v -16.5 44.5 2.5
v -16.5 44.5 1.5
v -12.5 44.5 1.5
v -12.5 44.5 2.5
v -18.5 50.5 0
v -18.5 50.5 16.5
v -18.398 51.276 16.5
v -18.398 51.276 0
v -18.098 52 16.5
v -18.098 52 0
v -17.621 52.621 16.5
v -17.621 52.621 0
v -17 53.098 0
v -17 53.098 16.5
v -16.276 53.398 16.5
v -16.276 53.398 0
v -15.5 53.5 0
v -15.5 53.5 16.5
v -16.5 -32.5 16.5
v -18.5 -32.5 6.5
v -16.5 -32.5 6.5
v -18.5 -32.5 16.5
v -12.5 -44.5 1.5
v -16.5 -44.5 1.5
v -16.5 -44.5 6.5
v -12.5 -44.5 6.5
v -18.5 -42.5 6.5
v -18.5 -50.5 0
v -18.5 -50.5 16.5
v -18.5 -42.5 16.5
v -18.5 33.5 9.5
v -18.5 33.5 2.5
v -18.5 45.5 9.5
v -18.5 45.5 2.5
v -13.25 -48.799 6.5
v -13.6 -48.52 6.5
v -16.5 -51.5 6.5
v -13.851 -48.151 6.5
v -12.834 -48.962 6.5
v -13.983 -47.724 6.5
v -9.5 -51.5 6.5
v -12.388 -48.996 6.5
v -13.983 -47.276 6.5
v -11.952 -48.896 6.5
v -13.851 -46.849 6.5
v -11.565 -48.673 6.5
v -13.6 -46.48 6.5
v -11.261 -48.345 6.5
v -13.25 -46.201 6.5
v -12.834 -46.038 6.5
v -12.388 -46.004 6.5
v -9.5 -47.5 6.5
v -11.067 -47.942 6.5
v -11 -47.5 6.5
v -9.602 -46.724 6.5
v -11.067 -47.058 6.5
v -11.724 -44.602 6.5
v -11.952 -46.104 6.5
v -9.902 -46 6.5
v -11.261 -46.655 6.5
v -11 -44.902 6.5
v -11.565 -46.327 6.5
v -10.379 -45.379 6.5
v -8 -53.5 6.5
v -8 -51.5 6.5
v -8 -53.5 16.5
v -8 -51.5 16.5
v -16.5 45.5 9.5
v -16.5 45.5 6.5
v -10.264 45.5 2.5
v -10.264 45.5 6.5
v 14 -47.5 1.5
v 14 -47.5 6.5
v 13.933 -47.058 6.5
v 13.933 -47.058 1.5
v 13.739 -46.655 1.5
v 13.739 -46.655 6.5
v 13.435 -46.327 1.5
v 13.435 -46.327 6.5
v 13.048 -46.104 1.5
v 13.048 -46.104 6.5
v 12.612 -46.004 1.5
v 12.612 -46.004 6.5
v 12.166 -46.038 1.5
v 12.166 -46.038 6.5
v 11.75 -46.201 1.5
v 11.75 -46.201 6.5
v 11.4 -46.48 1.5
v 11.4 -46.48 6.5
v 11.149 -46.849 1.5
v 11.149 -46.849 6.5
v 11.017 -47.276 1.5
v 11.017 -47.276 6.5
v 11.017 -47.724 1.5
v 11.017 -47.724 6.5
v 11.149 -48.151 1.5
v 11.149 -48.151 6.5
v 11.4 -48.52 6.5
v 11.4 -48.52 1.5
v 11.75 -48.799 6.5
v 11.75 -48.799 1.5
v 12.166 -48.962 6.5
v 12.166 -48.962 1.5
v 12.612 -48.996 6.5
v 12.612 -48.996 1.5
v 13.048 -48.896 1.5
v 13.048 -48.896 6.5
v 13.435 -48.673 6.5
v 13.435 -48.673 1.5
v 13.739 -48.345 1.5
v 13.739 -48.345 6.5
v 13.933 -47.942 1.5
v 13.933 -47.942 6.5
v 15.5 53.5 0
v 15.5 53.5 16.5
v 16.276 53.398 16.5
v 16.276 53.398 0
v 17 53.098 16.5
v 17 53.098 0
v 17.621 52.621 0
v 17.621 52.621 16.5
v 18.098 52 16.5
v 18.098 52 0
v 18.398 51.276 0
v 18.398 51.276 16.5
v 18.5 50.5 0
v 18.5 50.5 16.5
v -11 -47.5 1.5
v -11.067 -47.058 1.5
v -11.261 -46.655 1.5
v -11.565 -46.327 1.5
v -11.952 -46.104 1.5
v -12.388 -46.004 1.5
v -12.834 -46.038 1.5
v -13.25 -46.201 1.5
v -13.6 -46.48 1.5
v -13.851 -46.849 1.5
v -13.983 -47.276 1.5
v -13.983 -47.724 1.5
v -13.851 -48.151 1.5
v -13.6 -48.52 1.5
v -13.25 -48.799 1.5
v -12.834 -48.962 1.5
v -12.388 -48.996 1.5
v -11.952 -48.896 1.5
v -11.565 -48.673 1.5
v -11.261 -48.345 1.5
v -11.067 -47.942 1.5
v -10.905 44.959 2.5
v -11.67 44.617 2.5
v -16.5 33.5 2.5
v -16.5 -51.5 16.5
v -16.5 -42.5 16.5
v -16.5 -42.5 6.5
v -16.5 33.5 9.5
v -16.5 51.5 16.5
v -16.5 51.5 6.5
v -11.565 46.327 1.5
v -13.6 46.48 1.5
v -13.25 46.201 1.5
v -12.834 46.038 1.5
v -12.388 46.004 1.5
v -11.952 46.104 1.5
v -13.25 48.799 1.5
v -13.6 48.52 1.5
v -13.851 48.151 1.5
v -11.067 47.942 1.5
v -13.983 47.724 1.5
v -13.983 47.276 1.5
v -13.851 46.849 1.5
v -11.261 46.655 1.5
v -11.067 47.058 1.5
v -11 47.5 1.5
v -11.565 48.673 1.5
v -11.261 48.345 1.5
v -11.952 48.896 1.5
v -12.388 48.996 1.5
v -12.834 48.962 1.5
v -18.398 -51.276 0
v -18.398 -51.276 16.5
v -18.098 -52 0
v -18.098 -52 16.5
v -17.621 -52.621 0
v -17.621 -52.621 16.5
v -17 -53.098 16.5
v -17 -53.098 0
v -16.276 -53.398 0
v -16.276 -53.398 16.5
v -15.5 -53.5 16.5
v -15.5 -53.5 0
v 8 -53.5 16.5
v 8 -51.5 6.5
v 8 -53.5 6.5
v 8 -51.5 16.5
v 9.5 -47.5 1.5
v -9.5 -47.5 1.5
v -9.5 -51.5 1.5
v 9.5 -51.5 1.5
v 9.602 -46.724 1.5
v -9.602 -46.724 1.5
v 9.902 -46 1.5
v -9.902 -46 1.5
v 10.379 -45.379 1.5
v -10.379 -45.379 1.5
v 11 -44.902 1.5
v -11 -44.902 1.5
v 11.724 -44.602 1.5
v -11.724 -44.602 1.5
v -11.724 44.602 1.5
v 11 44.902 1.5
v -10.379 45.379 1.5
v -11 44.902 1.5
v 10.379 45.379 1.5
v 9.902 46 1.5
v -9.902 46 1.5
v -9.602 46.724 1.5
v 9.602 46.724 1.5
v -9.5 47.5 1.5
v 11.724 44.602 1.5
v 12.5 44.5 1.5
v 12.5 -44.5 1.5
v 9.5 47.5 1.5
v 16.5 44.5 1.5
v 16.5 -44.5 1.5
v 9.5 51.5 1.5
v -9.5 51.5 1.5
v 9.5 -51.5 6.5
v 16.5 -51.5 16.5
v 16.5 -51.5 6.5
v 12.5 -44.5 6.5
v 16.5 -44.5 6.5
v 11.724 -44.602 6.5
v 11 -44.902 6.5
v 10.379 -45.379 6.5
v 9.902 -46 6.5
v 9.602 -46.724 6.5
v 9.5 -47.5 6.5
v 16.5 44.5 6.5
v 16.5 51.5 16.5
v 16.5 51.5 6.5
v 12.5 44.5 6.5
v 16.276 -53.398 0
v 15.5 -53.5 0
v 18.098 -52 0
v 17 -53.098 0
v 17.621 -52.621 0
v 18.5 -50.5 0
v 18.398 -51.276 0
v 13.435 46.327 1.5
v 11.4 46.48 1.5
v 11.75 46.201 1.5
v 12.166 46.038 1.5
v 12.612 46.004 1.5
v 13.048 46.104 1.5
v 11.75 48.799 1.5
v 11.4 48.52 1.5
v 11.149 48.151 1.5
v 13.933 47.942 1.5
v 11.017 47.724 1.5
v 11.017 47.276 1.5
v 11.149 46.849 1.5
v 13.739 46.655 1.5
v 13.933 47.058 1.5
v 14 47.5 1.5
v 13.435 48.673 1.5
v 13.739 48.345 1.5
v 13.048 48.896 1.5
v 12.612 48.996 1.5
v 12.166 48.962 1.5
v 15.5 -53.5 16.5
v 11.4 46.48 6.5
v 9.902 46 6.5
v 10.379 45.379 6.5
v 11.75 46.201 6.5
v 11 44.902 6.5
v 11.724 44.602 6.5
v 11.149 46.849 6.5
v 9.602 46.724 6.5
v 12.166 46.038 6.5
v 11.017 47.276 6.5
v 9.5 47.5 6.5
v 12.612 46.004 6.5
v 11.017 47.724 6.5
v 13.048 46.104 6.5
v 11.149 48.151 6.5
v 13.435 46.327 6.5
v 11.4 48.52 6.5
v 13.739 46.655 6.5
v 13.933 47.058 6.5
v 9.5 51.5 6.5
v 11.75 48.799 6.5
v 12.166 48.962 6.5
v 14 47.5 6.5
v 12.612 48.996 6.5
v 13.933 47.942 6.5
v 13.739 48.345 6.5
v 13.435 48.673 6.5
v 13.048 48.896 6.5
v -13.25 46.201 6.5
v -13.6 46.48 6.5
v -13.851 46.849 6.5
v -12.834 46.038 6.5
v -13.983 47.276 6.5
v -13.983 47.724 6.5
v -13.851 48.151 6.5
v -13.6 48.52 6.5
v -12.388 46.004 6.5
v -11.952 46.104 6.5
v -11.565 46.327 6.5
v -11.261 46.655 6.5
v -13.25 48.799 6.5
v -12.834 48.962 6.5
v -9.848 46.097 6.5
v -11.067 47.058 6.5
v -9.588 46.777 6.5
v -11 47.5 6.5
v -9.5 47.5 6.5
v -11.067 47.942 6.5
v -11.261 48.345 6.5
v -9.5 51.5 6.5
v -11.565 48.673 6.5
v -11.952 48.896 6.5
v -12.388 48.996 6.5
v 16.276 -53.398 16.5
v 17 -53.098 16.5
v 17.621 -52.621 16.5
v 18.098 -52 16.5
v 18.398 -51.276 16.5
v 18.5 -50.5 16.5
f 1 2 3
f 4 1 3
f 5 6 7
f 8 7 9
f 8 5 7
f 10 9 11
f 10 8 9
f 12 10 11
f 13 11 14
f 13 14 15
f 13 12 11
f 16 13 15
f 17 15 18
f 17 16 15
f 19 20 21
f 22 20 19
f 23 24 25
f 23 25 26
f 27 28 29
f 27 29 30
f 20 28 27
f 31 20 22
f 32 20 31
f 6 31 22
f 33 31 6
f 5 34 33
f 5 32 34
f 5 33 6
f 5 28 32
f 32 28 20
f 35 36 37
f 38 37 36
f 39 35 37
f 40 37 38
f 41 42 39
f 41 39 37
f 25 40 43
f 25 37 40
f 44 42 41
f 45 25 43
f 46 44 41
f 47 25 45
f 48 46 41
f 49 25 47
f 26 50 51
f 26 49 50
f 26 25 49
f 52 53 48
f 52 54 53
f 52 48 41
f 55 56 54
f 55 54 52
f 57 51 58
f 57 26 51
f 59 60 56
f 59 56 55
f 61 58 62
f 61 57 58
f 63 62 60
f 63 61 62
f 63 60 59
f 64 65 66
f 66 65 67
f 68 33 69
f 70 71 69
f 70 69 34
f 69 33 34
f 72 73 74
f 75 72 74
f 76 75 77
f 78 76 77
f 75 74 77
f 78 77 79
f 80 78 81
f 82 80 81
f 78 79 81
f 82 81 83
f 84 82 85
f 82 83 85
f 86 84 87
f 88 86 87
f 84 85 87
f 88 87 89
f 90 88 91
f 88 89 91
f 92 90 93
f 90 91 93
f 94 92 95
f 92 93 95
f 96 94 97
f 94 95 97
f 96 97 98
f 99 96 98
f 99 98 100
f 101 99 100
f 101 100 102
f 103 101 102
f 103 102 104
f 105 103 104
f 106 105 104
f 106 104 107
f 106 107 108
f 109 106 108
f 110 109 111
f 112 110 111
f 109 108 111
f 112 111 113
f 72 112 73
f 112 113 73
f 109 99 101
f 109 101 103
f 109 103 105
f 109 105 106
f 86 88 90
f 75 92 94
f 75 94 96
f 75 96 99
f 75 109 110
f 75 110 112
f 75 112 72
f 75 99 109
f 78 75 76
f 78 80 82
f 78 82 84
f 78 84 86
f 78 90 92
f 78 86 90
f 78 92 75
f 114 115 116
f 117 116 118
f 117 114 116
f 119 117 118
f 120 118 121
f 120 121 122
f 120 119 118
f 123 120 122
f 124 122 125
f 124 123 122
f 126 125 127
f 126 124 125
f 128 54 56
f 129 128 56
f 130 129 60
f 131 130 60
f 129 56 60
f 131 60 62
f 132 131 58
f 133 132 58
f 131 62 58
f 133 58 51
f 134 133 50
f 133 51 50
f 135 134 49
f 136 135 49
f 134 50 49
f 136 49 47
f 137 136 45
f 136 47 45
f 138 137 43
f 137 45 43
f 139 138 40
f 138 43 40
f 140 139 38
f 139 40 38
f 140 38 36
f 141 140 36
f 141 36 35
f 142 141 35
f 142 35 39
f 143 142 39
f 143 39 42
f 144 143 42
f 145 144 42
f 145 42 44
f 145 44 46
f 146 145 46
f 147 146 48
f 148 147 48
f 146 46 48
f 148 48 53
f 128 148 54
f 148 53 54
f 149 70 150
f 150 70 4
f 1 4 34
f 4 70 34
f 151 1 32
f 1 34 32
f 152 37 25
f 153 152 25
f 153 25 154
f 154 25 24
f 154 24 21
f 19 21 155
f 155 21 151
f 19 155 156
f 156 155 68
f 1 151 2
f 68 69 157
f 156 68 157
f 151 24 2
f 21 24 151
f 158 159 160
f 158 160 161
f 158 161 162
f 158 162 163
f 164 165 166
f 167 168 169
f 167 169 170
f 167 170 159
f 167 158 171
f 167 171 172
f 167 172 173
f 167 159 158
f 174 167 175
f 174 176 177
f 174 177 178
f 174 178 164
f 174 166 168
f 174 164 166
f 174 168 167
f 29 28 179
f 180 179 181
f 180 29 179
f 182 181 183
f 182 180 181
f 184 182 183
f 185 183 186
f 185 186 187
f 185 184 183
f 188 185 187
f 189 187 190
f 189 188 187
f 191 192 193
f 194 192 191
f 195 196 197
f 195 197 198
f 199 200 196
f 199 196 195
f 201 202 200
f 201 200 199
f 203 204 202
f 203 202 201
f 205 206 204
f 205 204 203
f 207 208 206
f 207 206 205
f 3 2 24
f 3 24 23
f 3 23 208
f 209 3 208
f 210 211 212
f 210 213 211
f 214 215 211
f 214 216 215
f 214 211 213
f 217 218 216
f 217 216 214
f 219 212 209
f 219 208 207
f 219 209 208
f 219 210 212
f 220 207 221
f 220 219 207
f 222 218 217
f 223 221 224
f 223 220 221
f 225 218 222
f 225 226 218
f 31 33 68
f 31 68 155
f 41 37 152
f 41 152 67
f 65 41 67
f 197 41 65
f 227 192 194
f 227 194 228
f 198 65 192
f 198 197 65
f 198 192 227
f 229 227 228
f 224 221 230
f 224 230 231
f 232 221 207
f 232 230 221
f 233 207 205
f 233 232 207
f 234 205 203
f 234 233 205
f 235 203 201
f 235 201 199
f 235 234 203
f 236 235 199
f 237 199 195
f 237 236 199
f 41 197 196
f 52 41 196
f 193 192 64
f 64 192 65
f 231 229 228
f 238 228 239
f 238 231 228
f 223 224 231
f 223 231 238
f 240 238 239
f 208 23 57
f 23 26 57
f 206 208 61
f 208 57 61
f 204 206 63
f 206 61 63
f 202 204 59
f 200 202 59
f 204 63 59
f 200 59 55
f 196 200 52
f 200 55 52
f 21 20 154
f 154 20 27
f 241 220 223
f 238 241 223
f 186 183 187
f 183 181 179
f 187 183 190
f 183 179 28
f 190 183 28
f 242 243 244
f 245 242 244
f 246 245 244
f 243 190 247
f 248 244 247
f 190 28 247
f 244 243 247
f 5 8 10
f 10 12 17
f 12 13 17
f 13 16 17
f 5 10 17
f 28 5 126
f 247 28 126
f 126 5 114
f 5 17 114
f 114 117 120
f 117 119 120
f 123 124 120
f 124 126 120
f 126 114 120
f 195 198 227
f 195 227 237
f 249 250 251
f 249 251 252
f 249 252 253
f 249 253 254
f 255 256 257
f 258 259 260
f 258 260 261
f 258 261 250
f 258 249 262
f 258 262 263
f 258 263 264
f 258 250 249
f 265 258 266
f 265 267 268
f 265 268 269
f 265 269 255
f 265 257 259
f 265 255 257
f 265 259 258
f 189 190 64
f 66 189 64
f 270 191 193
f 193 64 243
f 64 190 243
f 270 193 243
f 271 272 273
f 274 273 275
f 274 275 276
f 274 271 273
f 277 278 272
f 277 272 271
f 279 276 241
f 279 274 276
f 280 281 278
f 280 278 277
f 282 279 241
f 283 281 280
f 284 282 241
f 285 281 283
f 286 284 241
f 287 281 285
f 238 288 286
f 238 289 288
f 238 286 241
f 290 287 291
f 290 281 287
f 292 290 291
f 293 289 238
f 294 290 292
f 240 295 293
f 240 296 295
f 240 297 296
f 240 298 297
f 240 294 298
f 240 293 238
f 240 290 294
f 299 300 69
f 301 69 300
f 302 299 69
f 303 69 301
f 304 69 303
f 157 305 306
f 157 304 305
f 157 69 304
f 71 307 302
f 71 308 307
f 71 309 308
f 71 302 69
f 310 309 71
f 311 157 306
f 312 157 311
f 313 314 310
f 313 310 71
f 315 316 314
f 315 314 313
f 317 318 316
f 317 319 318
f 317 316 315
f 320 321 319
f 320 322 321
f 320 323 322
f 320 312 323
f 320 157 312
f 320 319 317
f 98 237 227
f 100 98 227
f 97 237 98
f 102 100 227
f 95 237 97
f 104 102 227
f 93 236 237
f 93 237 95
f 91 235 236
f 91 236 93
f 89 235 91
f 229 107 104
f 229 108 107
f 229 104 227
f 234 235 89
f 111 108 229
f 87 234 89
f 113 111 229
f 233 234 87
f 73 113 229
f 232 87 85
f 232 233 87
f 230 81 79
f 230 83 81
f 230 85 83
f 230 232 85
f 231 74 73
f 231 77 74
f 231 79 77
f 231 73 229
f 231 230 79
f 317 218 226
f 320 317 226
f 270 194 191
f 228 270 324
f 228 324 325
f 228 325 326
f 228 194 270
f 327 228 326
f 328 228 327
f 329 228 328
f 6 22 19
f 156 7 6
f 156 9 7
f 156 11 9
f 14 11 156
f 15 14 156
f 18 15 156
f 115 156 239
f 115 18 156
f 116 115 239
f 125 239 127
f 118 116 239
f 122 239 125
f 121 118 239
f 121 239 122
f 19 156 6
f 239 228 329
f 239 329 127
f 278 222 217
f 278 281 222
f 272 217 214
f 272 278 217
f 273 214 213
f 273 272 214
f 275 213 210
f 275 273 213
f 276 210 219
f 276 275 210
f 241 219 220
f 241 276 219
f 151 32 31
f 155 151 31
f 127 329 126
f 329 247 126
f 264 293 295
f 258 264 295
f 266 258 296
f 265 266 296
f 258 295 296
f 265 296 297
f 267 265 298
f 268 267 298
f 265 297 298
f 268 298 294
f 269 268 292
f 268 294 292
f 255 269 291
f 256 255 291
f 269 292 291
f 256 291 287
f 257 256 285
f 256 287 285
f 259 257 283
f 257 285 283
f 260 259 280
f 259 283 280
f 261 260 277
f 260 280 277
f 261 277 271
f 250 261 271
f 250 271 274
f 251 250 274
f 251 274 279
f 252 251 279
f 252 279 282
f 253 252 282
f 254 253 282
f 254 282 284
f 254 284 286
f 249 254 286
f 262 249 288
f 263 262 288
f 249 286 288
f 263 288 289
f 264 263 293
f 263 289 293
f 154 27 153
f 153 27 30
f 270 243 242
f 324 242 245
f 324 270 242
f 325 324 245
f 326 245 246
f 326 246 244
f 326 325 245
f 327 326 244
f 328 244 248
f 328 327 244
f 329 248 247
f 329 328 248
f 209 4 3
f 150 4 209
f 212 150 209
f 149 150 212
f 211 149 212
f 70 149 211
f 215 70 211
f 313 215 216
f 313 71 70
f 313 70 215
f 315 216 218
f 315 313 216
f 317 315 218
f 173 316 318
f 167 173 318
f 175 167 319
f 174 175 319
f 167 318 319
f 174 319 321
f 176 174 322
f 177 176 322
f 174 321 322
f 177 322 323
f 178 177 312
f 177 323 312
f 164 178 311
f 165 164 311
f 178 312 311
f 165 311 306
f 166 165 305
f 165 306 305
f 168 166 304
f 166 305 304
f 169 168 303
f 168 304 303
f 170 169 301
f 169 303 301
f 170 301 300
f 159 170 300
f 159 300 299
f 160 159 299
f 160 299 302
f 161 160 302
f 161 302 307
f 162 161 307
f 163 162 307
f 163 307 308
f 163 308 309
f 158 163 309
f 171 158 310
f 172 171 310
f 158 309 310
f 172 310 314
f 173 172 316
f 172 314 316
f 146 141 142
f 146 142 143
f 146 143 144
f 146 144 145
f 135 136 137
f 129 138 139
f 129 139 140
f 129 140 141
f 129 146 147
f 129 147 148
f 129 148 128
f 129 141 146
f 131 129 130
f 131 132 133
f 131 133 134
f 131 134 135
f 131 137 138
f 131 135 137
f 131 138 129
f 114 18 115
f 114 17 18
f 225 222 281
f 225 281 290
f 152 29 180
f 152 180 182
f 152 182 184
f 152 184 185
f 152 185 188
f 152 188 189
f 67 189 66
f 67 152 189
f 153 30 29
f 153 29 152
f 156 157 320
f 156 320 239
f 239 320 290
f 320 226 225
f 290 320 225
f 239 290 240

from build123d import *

# Parameters (mm, degrees)
F0_W      = 37
F0_H      = 107
F1_DEPTH  = 1.5
F2_W      = 37
F2_H      = 107
F2_W_2    = 33
F2_H_2    = 103
F3_DEPTH  = 15
F4_W      = 7
F4_H      = 7
F5_DEPTH  = 5
F6_R      = 1.5
F7_DEPTH  = 5
F8_R      = 3
F9_W      = 8
F9_H      = 11.456422
F10_DEPTH = 25
F11_W     = 12
F11_H     = 3
F11_H_2   = 4
F11_W_2   = 10
F11_H_3   = 12.768078
F12_DEPTH = 25
F13_R     = 3


with BuildPart() as f1:
    # F0 (on Top) → F1 (new body)
    with BuildSketch(Plane.XY):
        Rectangle(F0_W, F0_H)
    extrude(amount=F1_DEPTH)

    # F2 (on face) → F3 (join)
    with BuildSketch(Plane.XY.offset(1.5)):
        Rectangle(F2_W, F2_H)
        Rectangle(F2_W_2, F2_H_2, mode=Mode.SUBTRACT)
    extrude(amount=F3_DEPTH)

    # F4 (on face) → F5 (join)
    with BuildSketch(Plane.XY.offset(1.5)):
        with Locations((-13, 48)):
            Rectangle(F4_W, F4_H)
        with Locations((13, 48)):
            Rectangle(F4_W, F4_H)
        with Locations((13, -48)):
            Rectangle(F4_W, F4_H)
        with Locations((-13, -48)):
            Rectangle(F4_W, F4_H)
    extrude(amount=F5_DEPTH)

    # F6 (on face) → F7 (cut)
    with BuildSketch(Plane.XY.offset(6.5)):
        with Locations((-12.5, 47.5)):
            Circle(F6_R)
        with Locations((12.5, 47.5)):
            Circle(F6_R)
        with Locations((12.5, -47.5)):
            Circle(F6_R)
        with Locations((-12.5, -47.5)):
            Circle(F6_R)
    extrude(amount=-F7_DEPTH, mode=Mode.SUBTRACT)

    # F8
    f8_edges = [f1.edges().sort_by_distance(p)[0] for p in [
        (-9.5, 44.5, 4),
        (9.5, 44.5, 4),
        (-9.5, -44.5, 4),
        (9.5, -44.5, 4),
    ]]
    fillet(f8_edges, radius=F8_R)

    # F9 (on face) → F10 (cut)
    with BuildSketch(Plane(origin=(0, -51.5, 0), x_dir=(-1, 0, 0), z_dir=(0, 1, 0))):
        with Locations((4, 12.228211)):
            Rectangle(F9_W, F9_H)
        with Locations((-4, 12.228211)):
            Rectangle(F9_W, F9_H)
    extrude(amount=-F10_DEPTH, mode=Mode.SUBTRACT)

    # F11 (on face) → F12 (cut)
    with BuildSketch(Plane(origin=(-18.5, 0, 0), x_dir=(0, -1, 0), z_dir=(-1, 0, 0))):
        with Locations((-39.5, 8)):
            Rectangle(F11_W, F11_H)
        with Locations((-39.5, 4.5)):
            Rectangle(F11_W, F11_H_2)
        with Locations((37.5, 12.884039)):
            Rectangle(F11_W_2, F11_H_3)
    extrude(amount=-F12_DEPTH, mode=Mode.SUBTRACT)

    # F13
    f13_edges = [f1.edges().sort_by_distance(p)[0] for p in [
        (18.5, -53.5, 8.25),
        (-18.5, -53.5, 8.25),
        (-18.5, 53.5, 8.25),
        (18.5, 53.5, 8.25),
    ]]
    fillet(f13_edges, radius=F13_R)


solid = f1.part
